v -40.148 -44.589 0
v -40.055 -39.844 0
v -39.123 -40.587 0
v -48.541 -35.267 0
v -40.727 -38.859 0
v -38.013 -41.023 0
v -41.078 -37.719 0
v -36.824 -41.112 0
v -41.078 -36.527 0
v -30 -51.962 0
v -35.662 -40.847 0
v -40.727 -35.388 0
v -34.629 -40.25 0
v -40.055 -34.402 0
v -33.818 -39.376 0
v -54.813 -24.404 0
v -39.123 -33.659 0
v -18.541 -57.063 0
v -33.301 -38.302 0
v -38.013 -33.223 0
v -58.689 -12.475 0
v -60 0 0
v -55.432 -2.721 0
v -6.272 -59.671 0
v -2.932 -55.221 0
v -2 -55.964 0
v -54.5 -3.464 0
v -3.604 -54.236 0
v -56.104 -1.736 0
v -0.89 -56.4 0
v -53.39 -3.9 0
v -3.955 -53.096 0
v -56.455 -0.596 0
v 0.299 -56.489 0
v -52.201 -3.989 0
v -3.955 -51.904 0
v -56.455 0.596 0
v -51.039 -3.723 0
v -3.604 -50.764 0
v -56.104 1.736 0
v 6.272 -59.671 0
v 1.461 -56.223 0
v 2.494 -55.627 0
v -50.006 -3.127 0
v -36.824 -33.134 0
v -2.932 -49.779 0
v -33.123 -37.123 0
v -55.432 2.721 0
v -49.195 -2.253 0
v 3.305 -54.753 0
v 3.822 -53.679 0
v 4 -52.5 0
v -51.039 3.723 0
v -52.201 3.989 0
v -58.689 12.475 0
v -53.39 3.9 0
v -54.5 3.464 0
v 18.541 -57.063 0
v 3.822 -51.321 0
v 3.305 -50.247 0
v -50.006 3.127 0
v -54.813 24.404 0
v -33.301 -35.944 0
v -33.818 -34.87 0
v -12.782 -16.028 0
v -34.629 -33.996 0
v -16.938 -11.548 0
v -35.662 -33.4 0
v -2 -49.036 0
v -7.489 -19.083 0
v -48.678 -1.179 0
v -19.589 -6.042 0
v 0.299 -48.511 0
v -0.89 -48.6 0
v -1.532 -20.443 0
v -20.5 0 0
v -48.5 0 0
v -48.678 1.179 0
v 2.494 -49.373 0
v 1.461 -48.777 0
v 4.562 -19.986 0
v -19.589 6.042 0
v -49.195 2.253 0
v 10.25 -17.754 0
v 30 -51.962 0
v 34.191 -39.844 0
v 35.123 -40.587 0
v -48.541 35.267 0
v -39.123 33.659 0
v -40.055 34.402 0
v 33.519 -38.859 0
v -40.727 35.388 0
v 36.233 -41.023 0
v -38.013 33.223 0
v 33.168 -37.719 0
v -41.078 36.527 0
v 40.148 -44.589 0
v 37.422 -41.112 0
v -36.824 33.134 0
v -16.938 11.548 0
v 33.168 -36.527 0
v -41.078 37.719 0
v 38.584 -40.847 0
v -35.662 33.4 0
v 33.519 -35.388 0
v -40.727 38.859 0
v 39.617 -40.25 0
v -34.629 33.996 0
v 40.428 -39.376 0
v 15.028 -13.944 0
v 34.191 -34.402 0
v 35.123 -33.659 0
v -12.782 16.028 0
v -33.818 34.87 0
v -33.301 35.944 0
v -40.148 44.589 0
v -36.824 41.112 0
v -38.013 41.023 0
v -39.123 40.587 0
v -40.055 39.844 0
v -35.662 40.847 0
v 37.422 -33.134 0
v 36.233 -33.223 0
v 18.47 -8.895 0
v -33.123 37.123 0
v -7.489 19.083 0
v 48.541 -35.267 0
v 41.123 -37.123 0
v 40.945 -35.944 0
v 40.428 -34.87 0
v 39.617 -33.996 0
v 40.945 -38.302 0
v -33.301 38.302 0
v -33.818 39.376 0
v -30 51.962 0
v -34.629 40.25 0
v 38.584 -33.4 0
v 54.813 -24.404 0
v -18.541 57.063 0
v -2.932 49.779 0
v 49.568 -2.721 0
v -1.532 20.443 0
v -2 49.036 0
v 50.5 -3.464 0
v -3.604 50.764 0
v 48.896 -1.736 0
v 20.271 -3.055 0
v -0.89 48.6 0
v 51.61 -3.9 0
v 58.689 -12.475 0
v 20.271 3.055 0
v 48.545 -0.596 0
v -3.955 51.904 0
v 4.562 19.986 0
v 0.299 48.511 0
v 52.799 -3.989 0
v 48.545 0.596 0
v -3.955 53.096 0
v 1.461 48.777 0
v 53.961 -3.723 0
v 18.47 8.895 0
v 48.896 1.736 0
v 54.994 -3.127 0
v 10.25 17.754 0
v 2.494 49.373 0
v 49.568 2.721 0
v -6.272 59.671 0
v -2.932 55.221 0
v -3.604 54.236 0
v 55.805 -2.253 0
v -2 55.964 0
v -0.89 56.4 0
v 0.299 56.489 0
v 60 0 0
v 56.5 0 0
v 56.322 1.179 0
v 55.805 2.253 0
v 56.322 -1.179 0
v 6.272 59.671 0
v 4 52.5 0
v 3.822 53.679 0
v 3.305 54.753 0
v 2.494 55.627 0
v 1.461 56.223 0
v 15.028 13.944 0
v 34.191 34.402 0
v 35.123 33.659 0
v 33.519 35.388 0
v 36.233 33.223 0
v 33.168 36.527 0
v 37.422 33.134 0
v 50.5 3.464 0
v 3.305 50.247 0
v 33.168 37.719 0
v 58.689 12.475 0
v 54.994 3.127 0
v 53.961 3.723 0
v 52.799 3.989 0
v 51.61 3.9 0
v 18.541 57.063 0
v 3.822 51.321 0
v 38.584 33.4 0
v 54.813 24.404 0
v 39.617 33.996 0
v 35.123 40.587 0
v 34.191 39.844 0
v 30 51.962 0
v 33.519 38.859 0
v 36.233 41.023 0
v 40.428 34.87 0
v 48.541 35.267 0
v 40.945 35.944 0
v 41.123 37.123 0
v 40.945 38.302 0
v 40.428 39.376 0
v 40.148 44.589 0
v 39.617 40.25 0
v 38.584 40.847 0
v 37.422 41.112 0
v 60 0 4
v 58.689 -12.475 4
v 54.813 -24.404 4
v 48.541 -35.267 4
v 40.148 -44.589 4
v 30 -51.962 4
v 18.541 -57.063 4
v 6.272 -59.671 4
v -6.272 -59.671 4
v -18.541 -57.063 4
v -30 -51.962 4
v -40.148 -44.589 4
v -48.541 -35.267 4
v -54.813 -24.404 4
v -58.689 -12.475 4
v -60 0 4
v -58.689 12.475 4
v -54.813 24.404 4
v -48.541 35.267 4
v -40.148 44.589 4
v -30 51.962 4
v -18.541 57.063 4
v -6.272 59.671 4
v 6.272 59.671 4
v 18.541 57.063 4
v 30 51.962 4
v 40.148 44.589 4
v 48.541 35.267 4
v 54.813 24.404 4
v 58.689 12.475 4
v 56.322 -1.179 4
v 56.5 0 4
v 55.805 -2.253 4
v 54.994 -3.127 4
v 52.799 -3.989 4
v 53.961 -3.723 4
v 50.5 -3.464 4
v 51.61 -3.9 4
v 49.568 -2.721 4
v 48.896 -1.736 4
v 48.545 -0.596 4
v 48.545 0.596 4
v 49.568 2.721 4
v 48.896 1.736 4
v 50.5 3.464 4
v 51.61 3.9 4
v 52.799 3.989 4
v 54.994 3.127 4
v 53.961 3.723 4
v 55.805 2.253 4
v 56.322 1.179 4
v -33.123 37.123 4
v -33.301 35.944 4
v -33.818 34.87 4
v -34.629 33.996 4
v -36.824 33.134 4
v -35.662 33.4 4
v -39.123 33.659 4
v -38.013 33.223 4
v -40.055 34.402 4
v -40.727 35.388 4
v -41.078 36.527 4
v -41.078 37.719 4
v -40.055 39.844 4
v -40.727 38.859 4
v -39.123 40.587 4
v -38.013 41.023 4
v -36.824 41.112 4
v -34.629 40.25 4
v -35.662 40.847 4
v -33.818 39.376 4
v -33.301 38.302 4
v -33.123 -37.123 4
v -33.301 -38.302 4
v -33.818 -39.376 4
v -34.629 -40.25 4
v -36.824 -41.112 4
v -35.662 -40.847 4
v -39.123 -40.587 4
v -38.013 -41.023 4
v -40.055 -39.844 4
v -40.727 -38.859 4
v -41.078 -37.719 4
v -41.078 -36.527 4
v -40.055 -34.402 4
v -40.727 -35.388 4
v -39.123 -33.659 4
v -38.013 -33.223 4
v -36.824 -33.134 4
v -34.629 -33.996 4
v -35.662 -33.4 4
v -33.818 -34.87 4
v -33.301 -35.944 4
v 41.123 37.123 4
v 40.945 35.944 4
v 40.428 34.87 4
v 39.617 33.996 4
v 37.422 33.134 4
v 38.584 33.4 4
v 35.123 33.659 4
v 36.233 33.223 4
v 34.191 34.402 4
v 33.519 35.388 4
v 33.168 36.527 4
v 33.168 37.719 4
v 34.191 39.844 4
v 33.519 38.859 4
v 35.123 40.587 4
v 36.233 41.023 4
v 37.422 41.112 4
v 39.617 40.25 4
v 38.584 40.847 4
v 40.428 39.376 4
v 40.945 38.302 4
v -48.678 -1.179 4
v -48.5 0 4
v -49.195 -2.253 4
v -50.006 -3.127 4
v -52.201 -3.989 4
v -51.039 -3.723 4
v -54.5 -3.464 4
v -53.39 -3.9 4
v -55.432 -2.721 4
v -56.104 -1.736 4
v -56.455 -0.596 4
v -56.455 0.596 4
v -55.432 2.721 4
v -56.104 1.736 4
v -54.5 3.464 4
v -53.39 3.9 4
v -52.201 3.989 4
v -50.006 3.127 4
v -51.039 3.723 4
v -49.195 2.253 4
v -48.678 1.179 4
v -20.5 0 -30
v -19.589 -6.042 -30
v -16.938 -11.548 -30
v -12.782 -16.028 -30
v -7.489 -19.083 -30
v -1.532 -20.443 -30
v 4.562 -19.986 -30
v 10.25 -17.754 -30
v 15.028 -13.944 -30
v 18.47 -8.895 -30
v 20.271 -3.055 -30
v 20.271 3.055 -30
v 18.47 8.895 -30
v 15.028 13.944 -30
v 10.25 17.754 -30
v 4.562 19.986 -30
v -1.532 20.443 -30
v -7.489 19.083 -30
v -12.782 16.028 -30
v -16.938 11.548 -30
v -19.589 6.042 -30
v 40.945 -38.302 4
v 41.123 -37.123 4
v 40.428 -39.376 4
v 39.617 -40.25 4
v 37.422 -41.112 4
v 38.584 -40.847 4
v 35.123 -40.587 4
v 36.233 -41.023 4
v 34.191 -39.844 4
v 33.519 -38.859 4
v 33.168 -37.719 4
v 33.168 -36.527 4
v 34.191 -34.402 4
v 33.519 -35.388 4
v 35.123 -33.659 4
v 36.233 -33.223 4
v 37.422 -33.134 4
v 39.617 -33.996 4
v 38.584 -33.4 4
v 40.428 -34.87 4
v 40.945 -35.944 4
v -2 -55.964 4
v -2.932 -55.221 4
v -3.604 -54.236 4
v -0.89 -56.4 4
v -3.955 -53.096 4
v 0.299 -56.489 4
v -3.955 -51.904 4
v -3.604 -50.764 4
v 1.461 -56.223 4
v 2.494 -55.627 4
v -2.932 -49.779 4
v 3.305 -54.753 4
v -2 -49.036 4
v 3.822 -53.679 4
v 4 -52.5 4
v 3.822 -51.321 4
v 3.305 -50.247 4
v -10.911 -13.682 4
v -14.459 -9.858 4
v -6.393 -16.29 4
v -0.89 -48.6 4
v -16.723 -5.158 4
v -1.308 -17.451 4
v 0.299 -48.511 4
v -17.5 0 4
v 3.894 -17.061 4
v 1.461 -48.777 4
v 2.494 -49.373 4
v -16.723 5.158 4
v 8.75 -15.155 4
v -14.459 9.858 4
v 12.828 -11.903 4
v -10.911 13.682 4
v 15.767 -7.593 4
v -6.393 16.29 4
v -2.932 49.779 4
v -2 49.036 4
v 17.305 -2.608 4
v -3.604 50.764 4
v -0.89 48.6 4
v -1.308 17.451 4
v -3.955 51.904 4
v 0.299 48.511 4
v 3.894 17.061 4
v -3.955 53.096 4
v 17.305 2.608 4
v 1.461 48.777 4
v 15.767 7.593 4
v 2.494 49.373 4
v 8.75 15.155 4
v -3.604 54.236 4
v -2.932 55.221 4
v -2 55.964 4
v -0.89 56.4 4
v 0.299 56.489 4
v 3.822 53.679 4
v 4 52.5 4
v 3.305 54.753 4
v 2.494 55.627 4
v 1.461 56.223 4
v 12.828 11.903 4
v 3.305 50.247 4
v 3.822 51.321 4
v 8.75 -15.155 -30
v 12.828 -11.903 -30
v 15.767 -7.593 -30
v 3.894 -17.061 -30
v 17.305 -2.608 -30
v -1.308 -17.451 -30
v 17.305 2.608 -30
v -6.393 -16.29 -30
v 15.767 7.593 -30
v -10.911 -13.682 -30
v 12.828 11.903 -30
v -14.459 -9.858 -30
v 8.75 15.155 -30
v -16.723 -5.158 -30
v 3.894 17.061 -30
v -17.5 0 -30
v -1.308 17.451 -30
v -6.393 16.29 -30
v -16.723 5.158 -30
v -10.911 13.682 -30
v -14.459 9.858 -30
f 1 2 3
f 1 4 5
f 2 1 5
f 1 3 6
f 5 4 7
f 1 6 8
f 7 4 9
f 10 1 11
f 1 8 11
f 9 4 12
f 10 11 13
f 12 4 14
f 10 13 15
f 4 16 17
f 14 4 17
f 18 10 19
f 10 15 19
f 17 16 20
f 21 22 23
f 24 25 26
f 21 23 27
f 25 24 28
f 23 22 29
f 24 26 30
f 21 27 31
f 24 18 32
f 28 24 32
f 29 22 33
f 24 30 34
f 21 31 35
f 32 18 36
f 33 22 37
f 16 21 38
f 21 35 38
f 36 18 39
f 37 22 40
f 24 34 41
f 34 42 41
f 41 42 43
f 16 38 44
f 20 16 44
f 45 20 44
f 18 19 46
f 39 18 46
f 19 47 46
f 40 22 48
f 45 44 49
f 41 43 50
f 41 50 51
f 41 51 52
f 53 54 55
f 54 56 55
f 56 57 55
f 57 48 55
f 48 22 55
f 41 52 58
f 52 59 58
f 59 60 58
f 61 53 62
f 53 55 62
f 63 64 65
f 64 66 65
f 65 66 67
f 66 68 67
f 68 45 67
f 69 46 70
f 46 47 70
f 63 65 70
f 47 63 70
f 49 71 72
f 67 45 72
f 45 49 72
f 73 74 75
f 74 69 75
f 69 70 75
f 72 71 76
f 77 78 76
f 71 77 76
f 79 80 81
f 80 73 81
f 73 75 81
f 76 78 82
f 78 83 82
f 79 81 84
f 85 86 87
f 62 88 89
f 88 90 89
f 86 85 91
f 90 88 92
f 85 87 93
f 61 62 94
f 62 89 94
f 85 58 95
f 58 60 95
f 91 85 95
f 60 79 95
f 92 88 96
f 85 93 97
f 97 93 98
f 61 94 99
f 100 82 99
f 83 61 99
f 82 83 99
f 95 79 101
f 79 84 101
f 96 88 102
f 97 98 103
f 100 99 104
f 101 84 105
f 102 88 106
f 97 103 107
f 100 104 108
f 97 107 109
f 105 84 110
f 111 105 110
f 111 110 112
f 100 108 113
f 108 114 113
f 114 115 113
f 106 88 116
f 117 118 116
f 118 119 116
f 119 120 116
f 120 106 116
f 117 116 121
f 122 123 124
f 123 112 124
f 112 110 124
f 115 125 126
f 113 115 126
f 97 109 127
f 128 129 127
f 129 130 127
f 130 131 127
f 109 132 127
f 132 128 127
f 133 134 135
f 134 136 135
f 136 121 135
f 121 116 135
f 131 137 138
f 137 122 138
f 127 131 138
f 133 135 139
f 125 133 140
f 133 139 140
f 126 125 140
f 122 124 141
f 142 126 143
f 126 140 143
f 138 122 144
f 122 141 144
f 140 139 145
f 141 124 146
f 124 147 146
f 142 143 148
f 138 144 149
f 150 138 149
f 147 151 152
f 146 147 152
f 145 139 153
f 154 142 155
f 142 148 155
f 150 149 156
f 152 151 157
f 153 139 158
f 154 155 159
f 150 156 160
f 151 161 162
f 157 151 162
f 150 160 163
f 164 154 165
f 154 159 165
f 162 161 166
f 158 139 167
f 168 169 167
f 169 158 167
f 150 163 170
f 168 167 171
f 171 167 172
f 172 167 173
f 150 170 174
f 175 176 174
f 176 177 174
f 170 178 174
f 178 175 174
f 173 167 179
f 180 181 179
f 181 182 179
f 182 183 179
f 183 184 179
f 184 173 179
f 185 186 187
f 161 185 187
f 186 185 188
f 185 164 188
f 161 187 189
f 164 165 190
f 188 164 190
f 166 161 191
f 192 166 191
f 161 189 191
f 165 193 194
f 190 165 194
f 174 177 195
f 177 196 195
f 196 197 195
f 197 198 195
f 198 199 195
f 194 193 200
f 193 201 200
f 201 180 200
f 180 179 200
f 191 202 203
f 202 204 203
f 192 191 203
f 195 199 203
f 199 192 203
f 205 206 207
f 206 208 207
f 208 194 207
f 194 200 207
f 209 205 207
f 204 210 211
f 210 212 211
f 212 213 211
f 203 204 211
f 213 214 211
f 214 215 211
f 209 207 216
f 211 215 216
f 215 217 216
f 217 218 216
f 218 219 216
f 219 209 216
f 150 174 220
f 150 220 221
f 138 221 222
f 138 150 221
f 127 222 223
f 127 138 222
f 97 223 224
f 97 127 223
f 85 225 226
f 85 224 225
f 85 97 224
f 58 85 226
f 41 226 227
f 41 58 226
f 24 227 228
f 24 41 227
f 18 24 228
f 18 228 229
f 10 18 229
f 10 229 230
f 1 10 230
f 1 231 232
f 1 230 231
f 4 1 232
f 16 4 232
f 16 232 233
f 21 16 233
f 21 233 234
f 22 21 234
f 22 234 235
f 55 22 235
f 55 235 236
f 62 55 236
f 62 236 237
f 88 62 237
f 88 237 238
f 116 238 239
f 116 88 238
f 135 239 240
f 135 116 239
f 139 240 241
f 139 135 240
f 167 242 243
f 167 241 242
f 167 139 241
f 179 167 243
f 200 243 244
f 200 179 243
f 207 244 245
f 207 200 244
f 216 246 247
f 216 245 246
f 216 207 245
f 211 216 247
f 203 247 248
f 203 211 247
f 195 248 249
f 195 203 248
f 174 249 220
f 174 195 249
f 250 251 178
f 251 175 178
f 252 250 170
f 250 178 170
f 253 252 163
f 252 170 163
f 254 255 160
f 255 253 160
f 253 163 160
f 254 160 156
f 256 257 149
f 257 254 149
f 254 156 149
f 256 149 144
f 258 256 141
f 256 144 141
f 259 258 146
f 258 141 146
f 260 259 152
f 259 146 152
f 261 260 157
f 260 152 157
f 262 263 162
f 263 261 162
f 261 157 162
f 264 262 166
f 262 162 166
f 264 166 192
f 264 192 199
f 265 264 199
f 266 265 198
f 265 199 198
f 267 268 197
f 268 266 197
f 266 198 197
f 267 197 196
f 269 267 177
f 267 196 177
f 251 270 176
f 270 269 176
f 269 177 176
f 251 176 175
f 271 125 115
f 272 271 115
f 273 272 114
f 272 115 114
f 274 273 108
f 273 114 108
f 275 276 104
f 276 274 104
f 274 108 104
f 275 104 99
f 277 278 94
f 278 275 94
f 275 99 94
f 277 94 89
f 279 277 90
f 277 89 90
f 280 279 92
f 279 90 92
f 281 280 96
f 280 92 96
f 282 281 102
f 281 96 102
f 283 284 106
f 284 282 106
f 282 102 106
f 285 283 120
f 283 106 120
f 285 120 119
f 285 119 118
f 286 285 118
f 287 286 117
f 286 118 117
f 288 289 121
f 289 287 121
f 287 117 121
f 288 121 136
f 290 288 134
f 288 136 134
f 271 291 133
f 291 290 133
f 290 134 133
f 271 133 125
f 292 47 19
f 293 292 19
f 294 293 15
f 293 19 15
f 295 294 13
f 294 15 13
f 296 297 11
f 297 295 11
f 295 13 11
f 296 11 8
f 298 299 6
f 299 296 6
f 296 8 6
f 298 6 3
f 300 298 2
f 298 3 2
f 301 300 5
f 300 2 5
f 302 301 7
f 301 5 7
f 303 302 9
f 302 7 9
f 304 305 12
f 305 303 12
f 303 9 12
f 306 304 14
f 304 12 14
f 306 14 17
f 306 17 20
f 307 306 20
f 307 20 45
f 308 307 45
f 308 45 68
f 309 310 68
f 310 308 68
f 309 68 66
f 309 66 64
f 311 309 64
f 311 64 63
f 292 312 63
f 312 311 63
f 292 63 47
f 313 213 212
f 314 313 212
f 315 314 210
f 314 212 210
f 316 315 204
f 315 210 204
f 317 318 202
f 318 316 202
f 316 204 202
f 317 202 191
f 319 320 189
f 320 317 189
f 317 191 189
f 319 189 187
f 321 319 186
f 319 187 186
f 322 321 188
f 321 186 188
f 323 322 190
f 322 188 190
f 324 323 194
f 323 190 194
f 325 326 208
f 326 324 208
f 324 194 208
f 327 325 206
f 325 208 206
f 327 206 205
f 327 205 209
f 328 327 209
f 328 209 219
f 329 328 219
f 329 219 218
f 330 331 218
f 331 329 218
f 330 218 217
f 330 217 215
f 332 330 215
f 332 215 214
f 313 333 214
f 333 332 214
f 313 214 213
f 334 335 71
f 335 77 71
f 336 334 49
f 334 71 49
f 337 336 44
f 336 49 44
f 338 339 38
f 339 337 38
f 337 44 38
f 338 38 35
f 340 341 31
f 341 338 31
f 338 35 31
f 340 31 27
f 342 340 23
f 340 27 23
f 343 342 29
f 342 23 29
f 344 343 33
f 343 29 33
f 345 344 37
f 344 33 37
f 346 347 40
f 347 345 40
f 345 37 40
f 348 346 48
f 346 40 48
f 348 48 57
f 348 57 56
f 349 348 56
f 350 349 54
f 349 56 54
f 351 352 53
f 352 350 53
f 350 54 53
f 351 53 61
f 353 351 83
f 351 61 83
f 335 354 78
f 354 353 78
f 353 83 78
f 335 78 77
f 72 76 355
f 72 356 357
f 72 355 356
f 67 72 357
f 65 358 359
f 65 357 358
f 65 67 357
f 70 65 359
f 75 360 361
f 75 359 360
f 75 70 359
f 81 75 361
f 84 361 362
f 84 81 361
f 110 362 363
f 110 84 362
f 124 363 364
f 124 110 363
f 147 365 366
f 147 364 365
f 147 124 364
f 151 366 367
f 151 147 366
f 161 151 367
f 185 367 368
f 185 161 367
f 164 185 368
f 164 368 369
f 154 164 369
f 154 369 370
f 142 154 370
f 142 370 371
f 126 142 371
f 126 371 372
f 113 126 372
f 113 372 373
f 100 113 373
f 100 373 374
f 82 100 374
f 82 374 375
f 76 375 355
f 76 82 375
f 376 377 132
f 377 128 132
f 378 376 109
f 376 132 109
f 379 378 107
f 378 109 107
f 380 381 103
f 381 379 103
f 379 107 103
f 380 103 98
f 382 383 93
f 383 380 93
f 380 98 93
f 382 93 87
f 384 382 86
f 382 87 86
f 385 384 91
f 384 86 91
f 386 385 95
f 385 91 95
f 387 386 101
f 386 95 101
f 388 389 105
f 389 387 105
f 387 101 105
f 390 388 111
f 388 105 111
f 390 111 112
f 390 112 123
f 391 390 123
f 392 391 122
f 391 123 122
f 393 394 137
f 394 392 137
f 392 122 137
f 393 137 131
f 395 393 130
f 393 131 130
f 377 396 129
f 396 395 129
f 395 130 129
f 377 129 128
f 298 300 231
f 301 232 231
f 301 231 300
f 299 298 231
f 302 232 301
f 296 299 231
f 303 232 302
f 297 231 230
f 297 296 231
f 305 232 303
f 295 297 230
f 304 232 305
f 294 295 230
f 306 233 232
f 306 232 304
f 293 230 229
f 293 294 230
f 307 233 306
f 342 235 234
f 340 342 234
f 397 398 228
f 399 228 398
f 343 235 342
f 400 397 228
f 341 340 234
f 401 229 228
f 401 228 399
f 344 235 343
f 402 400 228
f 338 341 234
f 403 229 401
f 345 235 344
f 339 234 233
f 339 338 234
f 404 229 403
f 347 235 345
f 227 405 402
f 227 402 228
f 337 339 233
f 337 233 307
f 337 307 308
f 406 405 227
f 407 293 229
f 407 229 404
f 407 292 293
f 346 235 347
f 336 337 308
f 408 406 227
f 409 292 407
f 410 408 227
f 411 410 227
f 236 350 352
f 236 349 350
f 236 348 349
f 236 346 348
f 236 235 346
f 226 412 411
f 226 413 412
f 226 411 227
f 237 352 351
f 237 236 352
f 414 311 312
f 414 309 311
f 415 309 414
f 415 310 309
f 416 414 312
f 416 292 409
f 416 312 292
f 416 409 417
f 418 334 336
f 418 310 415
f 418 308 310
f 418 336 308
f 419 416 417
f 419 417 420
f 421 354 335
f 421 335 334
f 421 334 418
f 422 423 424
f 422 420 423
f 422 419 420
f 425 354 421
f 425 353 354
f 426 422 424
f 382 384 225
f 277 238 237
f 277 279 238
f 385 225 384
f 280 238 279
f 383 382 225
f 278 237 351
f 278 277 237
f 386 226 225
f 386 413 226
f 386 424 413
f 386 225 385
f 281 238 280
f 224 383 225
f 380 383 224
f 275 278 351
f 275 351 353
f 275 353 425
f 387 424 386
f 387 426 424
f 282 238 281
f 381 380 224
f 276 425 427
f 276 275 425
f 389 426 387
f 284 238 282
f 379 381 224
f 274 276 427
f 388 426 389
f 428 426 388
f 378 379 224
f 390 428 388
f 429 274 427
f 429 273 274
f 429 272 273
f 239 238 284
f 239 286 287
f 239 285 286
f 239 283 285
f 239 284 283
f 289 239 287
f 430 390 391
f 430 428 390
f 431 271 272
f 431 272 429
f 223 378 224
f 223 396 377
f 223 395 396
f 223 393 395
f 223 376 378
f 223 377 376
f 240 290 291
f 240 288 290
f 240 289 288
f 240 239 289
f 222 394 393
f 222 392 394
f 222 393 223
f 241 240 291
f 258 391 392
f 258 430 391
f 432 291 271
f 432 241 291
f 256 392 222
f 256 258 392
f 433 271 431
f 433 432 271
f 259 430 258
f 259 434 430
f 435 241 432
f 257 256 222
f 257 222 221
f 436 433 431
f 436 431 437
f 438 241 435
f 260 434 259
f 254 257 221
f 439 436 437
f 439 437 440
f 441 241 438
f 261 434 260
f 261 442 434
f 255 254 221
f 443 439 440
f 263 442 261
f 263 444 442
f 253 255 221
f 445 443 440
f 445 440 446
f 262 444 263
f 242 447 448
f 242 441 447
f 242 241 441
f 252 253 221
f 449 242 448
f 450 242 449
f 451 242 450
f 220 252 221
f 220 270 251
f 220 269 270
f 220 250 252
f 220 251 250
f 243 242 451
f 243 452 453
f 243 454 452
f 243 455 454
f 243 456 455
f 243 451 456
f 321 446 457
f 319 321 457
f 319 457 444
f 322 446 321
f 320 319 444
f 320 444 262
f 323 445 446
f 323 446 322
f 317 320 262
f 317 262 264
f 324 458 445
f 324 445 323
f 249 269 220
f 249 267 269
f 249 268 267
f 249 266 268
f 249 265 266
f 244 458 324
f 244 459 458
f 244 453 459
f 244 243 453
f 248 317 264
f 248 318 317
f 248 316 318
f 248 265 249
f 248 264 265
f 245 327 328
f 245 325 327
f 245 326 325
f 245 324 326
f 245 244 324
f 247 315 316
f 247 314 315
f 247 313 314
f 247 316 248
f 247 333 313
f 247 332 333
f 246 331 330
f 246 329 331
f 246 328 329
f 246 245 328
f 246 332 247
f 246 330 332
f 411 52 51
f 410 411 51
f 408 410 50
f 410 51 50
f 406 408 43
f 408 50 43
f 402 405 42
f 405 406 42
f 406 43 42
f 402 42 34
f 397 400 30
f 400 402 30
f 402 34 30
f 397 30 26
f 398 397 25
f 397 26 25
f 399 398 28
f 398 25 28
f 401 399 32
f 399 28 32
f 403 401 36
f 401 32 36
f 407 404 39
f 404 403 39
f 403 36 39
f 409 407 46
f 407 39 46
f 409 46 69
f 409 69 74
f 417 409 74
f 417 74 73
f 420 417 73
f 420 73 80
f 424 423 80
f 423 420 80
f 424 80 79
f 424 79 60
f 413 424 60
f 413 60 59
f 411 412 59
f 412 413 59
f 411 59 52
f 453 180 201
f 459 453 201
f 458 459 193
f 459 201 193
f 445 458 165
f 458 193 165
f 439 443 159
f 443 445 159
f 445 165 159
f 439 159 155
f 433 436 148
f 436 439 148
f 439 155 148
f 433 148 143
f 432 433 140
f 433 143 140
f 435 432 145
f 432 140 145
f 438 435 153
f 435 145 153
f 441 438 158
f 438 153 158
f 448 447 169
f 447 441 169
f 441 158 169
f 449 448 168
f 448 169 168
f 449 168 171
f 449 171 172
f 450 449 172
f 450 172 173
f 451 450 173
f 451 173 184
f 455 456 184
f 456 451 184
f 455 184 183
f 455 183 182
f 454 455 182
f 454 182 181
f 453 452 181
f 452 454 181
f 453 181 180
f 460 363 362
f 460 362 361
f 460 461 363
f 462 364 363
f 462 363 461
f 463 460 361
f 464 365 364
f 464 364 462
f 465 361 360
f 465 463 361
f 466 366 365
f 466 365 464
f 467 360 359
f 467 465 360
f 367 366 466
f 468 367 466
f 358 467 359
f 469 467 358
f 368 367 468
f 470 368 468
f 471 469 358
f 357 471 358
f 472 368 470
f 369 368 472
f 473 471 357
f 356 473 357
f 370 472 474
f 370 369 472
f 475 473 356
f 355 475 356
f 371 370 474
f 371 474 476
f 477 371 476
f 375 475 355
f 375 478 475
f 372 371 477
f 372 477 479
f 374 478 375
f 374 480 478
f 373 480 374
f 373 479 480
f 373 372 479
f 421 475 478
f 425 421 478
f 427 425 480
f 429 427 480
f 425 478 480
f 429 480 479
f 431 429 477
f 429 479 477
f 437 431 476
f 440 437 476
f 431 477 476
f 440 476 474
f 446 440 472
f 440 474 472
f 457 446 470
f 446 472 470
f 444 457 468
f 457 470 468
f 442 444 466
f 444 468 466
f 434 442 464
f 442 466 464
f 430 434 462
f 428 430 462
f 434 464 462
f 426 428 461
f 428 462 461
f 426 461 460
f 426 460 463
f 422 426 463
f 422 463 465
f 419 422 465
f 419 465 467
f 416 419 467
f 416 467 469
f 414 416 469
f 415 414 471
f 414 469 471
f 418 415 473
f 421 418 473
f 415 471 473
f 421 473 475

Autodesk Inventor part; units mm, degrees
ref_plane "YZ Plane" through (0, 0, 0) normal (1, 0, 0) x (0, 1, 0)
ref_plane "XZ Plane" through (0, 0, 0) normal (0, 1, 0) x (-1, 0, 0)
ref_plane "XY Plane" through (0, 0, 0) normal (0, 0, 1) x (1, 0, 0)
sketch "Boceto1" plane through (0, 0, 0) normal (0, 0, 1) x (1, 0, 0)
  circle A0 centre (0, 0) radius 60
  circle A1 centre (0, 0) radius 48.5 construction
  circle A2 centre (0, 0) radius 52.5 construction
  line L0 (0, -61.2439) -> (0, 59.6068) construction
  line L1 (-77.557, 0) -> (94.8903, 0) construction
  circle A3 centre (0, 52.5) radius 4
  circle A4 centre (-37.1231, 37.1231) radius 4
  circle A5 centre (-52.5, 0) radius 4
  circle A6 centre (-37.1231, -37.1231) radius 4
  circle A7 centre (0, -52.5) radius 4
  circle A8 centre (37.1231, -37.1231) radius 4
  circle A9 centre (52.5, 0) radius 4
  circle A10 centre (37.1231, 37.1231) radius 4
  dimension "d2" = 105
  dimension "d0" = 120
  dimension "d1" = 97
  dimension "d3" = 8
  dimension "d6" = 360
extrude "Extrusión1" add sketch "Boceto1" along normal blind 4
sketch "Boceto2" plane through (0, 0, 0) normal (0, 0, -1) x (-1, 0, 0)
  circle A0 centre (0, 0) radius 20.5
  dimension "d10" = 41
extrude "Extrusión2" add sketch "Boceto2" along normal blind 30
sketch "Boceto3" plane through (0, 0, -30) normal (0, 0, -1) x (-1, 0, 0)
  circle A0 centre (0, 0) radius 17.5
  dimension "d13" = 35
extrude "Extrusión3" cut sketch "Boceto3" against normal blind 35
properties part number "CESTO MEDIDOR ESPORAS"
